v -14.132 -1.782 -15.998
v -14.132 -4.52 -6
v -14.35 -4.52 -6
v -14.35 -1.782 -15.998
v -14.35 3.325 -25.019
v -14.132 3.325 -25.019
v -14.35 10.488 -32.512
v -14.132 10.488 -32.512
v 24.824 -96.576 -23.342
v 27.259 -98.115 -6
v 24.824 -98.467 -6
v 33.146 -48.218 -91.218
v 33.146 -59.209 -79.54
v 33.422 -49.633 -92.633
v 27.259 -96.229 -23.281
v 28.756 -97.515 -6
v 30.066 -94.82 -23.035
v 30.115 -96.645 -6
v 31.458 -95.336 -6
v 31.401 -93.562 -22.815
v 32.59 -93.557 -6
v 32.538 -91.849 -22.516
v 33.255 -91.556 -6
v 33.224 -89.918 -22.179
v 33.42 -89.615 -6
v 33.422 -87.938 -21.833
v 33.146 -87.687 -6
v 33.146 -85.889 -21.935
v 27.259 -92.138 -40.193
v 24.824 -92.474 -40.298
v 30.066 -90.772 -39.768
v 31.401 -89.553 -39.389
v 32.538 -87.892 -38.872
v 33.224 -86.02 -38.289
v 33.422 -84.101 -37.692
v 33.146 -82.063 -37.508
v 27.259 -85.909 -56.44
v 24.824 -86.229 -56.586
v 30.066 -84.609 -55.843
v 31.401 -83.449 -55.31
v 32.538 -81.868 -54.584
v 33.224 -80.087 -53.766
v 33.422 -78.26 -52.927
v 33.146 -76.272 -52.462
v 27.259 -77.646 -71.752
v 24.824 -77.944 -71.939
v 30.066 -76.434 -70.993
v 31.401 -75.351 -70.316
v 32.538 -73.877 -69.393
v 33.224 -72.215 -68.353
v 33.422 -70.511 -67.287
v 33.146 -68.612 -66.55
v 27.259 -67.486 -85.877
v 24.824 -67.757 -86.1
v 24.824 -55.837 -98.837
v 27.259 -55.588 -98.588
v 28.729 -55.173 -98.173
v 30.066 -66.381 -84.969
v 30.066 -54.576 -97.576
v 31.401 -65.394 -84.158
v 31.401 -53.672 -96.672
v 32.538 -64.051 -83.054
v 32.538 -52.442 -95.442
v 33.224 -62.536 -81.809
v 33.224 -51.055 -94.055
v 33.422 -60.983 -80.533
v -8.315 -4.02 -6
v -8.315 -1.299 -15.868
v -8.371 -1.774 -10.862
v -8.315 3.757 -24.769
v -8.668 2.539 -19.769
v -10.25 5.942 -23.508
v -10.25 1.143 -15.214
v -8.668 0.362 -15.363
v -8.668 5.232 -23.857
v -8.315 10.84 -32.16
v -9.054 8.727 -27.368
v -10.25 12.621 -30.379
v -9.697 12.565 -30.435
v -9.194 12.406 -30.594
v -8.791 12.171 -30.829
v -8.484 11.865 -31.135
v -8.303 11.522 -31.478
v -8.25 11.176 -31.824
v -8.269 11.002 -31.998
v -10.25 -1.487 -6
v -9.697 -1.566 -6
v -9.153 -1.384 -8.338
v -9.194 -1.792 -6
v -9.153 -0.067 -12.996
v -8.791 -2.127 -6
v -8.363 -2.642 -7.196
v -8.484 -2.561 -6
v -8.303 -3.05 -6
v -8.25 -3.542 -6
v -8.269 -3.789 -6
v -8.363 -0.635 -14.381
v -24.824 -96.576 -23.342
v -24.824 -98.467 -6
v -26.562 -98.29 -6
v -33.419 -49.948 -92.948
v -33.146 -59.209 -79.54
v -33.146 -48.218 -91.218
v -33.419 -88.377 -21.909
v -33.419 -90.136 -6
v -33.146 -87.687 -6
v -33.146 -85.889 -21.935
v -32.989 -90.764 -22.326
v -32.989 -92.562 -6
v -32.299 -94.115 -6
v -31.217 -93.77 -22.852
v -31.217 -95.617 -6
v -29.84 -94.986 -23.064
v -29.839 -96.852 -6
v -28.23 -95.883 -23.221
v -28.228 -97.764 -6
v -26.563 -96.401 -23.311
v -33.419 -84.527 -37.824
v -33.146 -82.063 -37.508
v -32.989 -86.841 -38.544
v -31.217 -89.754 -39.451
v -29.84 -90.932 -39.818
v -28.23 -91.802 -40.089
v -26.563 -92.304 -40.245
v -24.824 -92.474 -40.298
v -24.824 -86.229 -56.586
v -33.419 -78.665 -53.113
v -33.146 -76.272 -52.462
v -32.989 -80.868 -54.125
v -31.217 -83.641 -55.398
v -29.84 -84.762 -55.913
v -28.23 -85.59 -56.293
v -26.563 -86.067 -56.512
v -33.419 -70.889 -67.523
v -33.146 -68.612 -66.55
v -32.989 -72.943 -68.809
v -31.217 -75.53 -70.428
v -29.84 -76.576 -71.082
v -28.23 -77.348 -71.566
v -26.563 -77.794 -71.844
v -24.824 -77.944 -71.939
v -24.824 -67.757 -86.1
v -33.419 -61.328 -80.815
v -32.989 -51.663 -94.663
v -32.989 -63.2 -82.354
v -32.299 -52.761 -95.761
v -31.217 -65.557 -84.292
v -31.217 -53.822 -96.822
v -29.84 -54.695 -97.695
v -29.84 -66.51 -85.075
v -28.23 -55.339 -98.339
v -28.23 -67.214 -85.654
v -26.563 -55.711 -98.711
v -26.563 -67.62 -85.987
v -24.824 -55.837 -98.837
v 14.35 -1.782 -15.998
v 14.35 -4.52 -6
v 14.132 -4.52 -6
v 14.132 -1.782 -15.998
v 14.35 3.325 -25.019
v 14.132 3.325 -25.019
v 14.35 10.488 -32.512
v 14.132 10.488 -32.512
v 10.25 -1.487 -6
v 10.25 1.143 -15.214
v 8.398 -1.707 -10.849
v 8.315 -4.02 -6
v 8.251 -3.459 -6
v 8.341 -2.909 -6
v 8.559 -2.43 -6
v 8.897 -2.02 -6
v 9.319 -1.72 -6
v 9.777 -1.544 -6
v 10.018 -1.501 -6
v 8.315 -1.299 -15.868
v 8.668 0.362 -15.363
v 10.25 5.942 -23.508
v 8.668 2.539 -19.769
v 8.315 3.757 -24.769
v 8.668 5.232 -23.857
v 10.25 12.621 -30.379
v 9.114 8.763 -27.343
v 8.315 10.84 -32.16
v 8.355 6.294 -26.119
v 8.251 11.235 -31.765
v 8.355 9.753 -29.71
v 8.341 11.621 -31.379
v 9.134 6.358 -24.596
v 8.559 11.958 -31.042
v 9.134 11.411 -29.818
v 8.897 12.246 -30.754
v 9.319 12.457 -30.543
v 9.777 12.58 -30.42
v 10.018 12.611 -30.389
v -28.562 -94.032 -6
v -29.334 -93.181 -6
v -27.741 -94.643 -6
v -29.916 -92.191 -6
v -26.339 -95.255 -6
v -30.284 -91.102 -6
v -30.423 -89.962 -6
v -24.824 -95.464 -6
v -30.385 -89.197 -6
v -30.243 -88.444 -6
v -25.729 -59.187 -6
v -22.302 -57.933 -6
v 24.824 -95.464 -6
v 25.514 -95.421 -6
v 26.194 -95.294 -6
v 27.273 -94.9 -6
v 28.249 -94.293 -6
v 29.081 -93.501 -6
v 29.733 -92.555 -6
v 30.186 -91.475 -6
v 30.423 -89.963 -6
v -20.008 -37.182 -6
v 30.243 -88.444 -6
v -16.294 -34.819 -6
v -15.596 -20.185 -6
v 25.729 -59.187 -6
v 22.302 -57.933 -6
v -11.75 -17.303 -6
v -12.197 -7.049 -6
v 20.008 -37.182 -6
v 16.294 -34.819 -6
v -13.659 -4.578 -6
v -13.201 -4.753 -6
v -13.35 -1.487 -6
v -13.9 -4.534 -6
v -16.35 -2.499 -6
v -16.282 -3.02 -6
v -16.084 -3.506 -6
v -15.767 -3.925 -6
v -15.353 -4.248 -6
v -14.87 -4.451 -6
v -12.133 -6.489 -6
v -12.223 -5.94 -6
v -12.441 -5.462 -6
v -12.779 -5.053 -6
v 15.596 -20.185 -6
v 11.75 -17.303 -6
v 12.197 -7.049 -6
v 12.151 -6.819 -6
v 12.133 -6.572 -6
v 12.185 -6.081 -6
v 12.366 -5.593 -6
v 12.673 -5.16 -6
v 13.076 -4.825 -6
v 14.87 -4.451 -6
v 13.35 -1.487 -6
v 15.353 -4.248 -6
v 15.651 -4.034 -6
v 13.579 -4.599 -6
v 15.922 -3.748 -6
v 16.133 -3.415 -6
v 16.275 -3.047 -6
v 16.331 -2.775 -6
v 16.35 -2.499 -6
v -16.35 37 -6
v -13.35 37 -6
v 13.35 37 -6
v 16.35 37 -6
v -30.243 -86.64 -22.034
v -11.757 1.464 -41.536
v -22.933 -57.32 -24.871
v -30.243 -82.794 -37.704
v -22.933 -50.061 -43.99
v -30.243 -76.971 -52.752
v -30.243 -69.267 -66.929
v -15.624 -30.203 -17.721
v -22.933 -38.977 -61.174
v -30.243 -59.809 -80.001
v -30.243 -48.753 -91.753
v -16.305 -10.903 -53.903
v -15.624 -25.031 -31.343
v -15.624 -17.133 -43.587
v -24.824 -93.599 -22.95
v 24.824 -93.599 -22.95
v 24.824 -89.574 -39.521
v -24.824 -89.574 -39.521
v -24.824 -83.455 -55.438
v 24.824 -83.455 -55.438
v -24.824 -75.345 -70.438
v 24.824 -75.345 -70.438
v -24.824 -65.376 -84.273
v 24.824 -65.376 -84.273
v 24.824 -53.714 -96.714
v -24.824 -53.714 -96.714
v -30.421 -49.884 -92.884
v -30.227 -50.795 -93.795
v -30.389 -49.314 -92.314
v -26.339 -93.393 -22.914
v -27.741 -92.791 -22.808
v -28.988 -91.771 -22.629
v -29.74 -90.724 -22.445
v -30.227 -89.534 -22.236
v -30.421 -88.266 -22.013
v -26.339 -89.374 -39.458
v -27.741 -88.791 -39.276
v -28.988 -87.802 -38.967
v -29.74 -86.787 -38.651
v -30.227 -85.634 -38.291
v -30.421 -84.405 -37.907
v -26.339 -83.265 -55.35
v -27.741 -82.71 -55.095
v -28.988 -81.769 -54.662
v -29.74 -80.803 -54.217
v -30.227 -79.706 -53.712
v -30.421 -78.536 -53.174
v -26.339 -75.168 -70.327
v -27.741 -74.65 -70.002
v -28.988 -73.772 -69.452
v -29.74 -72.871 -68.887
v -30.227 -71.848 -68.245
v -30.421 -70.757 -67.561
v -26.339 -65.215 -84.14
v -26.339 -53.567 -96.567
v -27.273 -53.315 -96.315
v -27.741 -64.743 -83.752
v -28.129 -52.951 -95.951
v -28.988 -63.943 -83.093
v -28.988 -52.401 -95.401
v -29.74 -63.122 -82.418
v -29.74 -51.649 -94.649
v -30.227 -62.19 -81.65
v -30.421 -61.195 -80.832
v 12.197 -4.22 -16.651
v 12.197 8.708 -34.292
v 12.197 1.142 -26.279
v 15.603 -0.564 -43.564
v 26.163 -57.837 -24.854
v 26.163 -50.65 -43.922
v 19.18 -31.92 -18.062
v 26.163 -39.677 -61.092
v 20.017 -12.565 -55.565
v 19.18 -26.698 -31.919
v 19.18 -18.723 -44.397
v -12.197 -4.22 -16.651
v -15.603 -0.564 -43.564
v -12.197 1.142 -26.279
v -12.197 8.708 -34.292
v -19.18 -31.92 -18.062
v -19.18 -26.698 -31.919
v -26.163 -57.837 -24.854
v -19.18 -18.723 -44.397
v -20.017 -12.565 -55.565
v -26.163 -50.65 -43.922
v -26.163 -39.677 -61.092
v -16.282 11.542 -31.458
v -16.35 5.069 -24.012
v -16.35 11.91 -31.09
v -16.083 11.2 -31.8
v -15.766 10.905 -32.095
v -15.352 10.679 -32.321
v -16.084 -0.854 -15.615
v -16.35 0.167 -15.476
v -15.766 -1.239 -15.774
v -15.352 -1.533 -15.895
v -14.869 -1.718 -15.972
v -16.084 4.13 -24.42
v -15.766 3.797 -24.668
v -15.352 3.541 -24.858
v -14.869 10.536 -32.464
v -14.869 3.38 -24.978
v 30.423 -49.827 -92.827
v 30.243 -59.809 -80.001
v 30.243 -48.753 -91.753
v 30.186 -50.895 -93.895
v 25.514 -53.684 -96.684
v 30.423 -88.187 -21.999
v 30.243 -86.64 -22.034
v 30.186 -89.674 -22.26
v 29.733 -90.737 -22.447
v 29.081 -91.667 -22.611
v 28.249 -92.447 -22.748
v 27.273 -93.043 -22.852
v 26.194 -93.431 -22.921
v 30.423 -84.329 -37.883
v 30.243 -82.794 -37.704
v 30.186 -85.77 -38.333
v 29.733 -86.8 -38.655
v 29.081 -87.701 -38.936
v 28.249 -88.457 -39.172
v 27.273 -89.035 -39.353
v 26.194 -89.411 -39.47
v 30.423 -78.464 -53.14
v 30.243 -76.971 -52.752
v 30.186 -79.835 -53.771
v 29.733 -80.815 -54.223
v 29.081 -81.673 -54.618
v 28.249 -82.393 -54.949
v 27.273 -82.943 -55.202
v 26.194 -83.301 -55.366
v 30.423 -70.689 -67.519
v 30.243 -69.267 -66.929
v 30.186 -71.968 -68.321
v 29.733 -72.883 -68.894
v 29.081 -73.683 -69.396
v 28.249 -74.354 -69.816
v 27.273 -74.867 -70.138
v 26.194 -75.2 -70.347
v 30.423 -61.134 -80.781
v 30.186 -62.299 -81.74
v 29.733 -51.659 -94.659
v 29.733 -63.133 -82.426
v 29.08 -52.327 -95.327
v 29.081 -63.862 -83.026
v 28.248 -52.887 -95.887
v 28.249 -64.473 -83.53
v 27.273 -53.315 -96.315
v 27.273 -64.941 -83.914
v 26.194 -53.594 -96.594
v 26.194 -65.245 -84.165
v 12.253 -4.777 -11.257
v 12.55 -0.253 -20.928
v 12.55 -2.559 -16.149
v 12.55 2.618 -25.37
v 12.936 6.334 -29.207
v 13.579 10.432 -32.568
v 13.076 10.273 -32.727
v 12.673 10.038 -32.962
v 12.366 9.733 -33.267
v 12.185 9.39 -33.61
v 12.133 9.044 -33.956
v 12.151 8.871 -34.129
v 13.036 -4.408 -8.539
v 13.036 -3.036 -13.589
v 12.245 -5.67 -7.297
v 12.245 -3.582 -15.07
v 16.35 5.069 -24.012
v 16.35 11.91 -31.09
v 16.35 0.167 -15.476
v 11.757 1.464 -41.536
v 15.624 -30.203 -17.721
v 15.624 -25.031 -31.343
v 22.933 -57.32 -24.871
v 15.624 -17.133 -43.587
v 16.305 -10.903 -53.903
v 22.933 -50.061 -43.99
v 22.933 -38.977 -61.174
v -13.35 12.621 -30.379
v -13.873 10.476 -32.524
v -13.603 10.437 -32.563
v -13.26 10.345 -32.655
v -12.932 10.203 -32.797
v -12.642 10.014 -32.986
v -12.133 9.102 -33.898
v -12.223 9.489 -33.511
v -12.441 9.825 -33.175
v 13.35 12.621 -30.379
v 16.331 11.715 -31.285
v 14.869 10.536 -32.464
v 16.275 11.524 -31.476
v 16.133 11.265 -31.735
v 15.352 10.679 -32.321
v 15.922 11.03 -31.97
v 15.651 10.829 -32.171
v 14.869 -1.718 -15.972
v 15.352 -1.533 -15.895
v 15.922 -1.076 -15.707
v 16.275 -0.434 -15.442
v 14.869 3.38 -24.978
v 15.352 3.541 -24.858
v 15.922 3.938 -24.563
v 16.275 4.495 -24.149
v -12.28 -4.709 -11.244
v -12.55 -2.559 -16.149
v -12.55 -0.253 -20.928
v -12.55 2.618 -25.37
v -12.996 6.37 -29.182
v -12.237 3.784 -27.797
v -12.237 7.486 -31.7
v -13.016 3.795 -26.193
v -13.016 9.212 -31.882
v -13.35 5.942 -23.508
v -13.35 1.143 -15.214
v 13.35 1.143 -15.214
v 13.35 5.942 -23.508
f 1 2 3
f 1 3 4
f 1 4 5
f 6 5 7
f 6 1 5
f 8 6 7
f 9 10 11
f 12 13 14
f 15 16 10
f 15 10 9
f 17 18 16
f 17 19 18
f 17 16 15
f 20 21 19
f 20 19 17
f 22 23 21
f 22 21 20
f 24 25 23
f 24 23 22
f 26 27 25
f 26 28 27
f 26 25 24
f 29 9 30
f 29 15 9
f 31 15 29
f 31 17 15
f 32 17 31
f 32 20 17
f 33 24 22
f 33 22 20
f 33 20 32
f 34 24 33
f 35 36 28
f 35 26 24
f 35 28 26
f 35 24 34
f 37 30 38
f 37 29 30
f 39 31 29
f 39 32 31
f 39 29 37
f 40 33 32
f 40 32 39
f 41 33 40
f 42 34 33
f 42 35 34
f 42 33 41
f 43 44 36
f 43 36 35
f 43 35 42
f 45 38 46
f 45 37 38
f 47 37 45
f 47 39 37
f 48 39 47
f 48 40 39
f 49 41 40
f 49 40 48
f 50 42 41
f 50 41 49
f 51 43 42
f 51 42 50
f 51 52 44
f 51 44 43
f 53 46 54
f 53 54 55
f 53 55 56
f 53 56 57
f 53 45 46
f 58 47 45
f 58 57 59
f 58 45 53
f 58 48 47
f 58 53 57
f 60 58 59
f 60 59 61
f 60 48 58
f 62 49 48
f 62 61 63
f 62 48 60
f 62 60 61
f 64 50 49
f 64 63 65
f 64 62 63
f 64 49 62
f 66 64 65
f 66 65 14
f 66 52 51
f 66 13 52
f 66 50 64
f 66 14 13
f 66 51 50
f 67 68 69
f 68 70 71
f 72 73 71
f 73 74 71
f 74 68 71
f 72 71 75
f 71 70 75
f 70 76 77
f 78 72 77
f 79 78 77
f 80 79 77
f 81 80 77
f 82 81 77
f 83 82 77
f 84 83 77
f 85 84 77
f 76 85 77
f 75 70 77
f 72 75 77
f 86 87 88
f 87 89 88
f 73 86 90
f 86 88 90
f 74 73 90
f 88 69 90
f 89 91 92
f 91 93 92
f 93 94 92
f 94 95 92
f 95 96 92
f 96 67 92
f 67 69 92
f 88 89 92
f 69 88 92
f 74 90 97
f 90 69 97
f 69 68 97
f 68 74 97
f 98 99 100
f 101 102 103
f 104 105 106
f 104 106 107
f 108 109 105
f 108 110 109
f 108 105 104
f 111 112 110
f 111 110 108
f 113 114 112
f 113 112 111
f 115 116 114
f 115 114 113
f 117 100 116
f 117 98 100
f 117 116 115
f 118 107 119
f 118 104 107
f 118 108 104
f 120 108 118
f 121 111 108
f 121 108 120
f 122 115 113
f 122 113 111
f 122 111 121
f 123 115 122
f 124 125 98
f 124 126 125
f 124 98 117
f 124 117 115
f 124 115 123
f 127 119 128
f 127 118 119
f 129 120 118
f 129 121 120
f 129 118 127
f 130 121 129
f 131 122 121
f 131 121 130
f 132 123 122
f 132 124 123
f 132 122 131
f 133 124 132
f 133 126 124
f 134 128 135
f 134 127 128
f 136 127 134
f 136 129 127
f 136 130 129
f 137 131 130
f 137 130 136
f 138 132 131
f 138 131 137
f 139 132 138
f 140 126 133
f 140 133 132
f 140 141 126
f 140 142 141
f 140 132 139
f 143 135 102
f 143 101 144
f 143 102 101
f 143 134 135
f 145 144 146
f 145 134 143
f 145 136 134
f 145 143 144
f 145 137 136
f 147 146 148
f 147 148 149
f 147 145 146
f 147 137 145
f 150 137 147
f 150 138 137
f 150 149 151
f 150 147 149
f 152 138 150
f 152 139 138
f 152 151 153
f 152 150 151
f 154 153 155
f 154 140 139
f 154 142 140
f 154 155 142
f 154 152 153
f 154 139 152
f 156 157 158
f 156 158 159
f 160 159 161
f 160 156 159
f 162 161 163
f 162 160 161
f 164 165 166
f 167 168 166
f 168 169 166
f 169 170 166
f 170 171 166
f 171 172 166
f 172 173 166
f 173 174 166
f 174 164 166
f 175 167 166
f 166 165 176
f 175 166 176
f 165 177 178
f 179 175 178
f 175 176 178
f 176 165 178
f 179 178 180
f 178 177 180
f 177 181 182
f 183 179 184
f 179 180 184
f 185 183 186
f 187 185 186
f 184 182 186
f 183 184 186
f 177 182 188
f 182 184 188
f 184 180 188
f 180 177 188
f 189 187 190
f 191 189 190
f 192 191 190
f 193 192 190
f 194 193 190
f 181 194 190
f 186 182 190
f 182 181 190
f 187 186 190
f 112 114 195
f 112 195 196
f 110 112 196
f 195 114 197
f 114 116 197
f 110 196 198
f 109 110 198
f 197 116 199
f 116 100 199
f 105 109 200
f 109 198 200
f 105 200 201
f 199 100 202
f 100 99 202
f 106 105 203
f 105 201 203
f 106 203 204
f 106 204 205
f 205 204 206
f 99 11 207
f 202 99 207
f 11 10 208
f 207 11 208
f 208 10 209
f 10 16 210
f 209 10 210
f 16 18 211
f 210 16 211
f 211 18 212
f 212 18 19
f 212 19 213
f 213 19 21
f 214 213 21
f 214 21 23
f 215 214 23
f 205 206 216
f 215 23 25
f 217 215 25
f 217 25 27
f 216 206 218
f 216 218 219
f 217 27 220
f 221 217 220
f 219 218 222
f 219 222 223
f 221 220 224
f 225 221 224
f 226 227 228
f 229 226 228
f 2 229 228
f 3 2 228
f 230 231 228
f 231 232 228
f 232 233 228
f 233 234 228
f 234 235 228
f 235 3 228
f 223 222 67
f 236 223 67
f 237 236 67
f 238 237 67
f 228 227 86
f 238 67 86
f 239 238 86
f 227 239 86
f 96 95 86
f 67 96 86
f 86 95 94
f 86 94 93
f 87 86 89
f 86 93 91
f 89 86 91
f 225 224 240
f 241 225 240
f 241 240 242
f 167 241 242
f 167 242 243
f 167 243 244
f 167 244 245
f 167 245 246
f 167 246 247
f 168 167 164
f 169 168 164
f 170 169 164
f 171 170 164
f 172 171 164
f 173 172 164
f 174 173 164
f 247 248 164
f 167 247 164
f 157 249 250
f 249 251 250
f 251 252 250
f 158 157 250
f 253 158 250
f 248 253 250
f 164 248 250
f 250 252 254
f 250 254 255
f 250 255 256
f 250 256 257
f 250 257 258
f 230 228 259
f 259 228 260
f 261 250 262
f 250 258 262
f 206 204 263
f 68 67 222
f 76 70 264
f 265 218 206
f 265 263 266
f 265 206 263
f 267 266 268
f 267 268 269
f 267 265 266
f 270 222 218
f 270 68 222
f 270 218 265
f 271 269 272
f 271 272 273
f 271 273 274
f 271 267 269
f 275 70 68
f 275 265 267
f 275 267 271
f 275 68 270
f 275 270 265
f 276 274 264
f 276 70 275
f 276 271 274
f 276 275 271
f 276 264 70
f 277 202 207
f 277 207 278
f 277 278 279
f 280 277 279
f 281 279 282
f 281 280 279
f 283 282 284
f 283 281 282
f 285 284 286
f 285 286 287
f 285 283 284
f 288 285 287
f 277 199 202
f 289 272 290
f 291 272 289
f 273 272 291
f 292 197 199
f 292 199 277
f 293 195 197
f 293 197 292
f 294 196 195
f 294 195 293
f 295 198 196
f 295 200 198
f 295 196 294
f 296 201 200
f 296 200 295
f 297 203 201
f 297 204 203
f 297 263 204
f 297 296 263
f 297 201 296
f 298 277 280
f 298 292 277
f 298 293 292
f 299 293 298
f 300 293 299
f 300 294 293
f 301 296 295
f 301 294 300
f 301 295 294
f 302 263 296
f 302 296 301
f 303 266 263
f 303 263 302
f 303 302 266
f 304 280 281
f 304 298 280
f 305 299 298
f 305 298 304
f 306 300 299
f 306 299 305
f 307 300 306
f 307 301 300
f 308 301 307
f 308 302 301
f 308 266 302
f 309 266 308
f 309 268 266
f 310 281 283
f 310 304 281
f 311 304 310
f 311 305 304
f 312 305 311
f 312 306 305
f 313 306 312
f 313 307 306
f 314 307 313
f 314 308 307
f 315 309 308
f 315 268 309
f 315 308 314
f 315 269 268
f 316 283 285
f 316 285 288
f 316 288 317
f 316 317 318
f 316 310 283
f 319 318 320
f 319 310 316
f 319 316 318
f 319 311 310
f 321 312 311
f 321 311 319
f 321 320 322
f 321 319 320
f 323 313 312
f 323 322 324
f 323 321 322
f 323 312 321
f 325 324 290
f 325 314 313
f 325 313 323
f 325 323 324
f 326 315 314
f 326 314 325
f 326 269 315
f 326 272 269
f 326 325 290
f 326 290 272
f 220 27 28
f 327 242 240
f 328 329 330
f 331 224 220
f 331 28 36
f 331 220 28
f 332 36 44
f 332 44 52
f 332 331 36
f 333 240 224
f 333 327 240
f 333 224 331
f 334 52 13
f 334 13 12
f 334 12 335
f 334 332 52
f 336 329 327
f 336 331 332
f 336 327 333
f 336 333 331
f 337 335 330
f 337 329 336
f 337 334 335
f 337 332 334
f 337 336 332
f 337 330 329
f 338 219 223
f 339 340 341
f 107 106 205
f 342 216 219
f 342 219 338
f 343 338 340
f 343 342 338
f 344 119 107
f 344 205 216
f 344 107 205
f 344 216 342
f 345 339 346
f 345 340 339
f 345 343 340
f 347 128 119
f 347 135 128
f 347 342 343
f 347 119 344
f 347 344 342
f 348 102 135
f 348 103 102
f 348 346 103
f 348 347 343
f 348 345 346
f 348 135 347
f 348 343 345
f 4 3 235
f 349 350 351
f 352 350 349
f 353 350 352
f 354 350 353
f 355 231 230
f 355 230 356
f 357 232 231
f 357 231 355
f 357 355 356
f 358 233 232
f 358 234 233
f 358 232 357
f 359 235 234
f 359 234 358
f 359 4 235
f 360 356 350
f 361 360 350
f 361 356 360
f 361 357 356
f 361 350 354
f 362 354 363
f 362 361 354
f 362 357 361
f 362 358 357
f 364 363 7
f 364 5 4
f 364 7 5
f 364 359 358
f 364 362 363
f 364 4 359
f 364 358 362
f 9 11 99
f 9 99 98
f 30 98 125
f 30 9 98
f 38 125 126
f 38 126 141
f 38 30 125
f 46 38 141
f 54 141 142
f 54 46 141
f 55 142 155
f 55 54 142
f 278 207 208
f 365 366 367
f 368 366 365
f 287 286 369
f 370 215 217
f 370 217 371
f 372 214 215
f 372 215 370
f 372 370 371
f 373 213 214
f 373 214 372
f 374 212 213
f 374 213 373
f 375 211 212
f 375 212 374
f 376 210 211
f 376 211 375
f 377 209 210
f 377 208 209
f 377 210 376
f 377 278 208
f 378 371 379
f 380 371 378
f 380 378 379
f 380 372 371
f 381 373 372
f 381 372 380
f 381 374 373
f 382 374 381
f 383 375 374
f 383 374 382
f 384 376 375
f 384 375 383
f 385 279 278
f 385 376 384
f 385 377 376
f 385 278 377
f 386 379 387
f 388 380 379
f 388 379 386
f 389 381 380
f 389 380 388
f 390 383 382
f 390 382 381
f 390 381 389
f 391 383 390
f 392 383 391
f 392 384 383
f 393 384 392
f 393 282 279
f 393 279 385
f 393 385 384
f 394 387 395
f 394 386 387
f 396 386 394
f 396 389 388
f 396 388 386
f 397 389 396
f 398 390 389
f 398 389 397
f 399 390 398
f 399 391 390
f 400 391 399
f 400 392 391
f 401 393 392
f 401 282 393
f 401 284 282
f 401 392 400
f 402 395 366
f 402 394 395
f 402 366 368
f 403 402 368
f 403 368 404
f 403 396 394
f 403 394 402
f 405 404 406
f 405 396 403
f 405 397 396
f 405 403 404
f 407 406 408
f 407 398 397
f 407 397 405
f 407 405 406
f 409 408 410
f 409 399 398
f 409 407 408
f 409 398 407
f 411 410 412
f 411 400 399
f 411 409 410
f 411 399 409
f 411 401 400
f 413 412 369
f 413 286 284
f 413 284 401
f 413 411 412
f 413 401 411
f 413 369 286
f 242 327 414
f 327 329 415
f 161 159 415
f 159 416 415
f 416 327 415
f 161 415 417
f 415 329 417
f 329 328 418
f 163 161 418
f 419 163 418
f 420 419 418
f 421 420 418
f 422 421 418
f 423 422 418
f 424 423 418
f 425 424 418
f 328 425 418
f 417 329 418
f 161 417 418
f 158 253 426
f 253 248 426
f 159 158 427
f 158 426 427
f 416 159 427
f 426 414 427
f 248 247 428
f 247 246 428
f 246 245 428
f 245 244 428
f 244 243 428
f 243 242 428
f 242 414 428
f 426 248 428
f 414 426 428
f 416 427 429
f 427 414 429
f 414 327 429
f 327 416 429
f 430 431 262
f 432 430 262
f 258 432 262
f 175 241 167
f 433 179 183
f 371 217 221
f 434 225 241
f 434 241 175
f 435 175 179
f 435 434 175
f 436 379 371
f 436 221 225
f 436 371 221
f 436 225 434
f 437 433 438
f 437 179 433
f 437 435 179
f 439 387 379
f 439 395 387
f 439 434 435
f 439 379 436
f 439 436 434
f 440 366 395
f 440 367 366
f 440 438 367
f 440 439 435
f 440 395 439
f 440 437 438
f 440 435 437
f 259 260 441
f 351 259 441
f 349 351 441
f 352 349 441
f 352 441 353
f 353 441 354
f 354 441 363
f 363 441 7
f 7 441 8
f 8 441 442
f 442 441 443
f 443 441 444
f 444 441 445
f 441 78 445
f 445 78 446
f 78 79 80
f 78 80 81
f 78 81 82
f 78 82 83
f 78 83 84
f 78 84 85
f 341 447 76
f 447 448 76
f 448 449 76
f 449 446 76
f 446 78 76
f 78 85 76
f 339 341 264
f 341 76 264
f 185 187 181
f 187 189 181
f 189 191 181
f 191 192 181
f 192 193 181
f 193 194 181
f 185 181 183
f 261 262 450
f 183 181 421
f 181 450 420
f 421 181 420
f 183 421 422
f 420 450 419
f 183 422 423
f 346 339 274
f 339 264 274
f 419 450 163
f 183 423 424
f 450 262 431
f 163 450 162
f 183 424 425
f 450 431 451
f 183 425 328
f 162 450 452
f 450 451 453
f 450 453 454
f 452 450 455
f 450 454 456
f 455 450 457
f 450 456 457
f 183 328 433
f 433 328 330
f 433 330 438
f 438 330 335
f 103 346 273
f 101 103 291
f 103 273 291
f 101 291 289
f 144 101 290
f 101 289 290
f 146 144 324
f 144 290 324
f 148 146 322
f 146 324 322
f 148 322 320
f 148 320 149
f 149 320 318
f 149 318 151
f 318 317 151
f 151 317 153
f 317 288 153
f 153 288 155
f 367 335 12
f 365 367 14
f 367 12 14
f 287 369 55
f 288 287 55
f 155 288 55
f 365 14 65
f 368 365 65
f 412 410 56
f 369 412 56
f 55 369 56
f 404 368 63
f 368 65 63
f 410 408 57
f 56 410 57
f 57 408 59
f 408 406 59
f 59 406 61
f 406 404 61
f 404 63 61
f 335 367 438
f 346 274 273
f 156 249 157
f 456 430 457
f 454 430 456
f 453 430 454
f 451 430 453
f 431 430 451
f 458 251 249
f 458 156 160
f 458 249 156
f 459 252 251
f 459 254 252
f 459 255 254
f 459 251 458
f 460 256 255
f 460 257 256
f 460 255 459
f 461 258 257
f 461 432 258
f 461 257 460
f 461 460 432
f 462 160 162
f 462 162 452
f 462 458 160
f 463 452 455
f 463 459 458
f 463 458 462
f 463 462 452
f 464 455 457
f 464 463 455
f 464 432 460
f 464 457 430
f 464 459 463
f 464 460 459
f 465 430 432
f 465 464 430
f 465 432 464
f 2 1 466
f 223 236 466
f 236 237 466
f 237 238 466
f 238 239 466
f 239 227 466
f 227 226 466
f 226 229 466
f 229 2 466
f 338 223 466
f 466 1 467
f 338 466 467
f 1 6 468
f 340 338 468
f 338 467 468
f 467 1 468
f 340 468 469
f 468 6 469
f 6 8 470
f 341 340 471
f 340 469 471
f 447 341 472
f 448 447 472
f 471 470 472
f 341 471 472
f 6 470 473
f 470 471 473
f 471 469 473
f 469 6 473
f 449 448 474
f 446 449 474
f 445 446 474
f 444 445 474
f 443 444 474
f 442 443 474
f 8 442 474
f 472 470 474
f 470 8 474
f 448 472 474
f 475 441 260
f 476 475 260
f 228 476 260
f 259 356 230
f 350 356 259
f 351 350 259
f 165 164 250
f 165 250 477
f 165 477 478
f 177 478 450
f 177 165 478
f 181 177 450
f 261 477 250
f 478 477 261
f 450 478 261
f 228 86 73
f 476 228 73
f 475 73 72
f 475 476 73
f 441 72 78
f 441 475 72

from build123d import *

# Parameters (mm, degrees)
F1_ANGLE_BACK  = 30
F1_ANGLE       = 120
F2_R           = 2
F4_DEPTH       = 25
F4_DEPTH_BACK  = 25
F5_DEPTH       = 25
F5_DEPTH_BACK  = 25
F8_R           = 5
F10_DEPTH      = 33.4248144675
F10_DEPTH_BACK = 33.4248144675
F12_DEPTH      = 50
F12_DEPTH_BACK = 50


# Not quite as in the source:
# - after a boolean that leaves OpenCascade's solid faulty, fix() repairs it
# - a feature of the source that left no trace in its solid (it failed there, or was rolled back) is left out


with BuildPart() as f1:
    # F0 (on Top) → F1 (revolve)
    with BuildSketch(Plane.XY, mode=Mode.PRIVATE) as f1_sk:
        with BuildLine():
            Line((9.6206148389, -1.9516889929), (7.6821408379, -2.0284350604))
            Line((7.6821408379, -2.0284350604), (30.2427770644, -88.5876107865))
            ThreePointArc((30.2427770644, -88.5876107865), (29.2549191731, -93.4242240292), (24.8238143675, -95.6))
            Line((24.8238143675, -95.6), (-24.8238143675, -95.6))
            ThreePointArc((-24.8238143675, -95.6), (-29.2549191731, -93.4242240292), (-30.2427770644, -88.5876107865))
            Line((-30.2427770644, -88.5876107865), (-7.6821408379, -2.0284350604))
            Line((-7.6821408379, -2.0284350604), (-9.6206148389, -1.9516889929))
            Line((-9.6206148389, -1.9516889929), (-13.35, -1.9516889929))
            Line((-13.35, -1.9516889929), (-13.35, 37))
            Line((-13.35, 37), (-16.35, 37))
            Line((-16.35, 37), (-16.35, -4.9516889929))
            Line((-16.35, -4.9516889929), (-11.5442770978, -4.9516889929))
            Line((-11.5442770978, -4.9516889929), (-33.1457927948, -87.8309737078))
            ThreePointArc((-33.1457927948, -87.8309737078), (-31.6287253189, -95.2586297591), (-24.8238143675, -98.6))
            Line((-24.8238143675, -98.6), (24.8238143675, -98.6))
            ThreePointArc((24.8238143675, -98.6), (31.6287253189, -95.2586297591), (33.1457927948, -87.8309737078))
            Line((33.1457927948, -87.8309737078), (11.5442770978, -4.9516889929))
            Line((11.5442770978, -4.9516889929), (16.35, -4.9516889929))
            Line((16.35, -4.9516889929), (16.35, 37))
            Line((16.35, 37), (13.35, 37))
            Line((13.35, 37), (13.35, -1.9516889929))
            Line((13.35, -1.9516889929), (9.6206148389, -1.9516889929))
        make_face()
    revolve(f1_sk.sketch.rotate(Axis((0.7210588083, 37, 0), (1, 0, 0)), -F1_ANGLE_BACK), axis=Axis((0.7210588083, 37, 0), (1, 0, 0)), revolution_arc=F1_ANGLE)

    # F2
    f2_edges = [f1.edges().sort_by_distance(p)[0] for p in [
        (7.682141, 3.200384, -19.514218),
        (11.544277, 0.668772, -20.975844),
        (16.35, 0.668772, -20.975844),
        (-7.682141, 3.200384, -19.514218),
        (-16.35, 0.668772, -20.975844),
        (-11.544277, 0.668772, -20.975844),
    ]]
    fillet(f2_edges, radius=F2_R)

    # F3 (on Right) → F4 (join, two sides)
    with BuildSketch(Plane.YZ) as f4_sk:
        with BuildLine():
            Line((51.55, 6), (26.6076951546, 6))
            Line((26.6076951546, 6), (34.6184301396, 1.375))
            ThreePointArc((34.6184301396, 1.375), (37.711752374, 2.6562960223), (39.75, 0))
            ThreePointArc((39.75, 0), (38.9445436483, -1.9445436483), (37, -2.75))
            Line((37, -2.75), (37, -6))
            Line((37, -6), (51.55, -6))
            Line((51.55, -6), (51.55, 6))
        make_face()
        with BuildLine():
            ThreePointArc((47.3738633754, 0.95), (47.505593785, 0.4830952573), (47.55, 0))
            ThreePointArc((47.55, 0), (47.505593785, -0.4830952573), (47.3738633754, -0.95))
            ThreePointArc((47.3738633754, -0.95), (46.7738329701, -1.8738329701), (45.85, -2.4738633754))
            ThreePointArc((45.85, -2.4738633754), (44.9, -2.65), (43.95, -2.4738633754))
            ThreePointArc((43.95, -2.4738633754), (43.0261670299, -1.8738329701), (42.4261366246, -0.95))
            ThreePointArc((42.4261366246, -0.95), (42.25, 0), (42.4261366246, 0.95))
            ThreePointArc((42.4261366246, 0.95), (43.0261670299, 1.8738329701), (43.95, 2.4738633754))
            ThreePointArc((43.95, 2.4738633754), (44.9, 2.65), (45.85, 2.4738633754))
            ThreePointArc((45.85, 2.4738633754), (46.7738329701, 1.8738329701), (47.3738633754, 0.95))
        make_face(mode=Mode.SUBTRACT)
        with BuildLine():
            Line((34.6184301396, 1.375), (26.6076951546, 6))
            Line((26.6076951546, 6), (22.45, 6))
            Line((22.45, 6), (22.45, -6))
            Line((22.45, -6), (37, -6))
            Line((37, -6), (37, -2.75))
            ThreePointArc((37, -2.75), (34.6184301396, -1.375), (34.6184301396, 1.375))
        make_face()
        with BuildLine():
            ThreePointArc((31.5738633754, 0.95), (31.705593785, 0.4830952573), (31.75, 0))
            ThreePointArc((31.75, 0), (31.705593785, -0.4830952573), (31.5738633754, -0.95))
            ThreePointArc((31.5738633754, -0.95), (30.9738329701, -1.8738329701), (30.05, -2.4738633754))
            ThreePointArc((30.05, -2.4738633754), (29.1, -2.65), (28.15, -2.4738633754))
            ThreePointArc((28.15, -2.4738633754), (27.2261670299, -1.8738329701), (26.6261366246, -0.95))
            ThreePointArc((26.6261366246, -0.95), (26.45, 0), (26.6261366246, 0.95))
            ThreePointArc((26.6261366246, 0.95), (27.2261670299, 1.8738329701), (28.15, 2.4738633754))
            ThreePointArc((28.15, 2.4738633754), (29.1, 2.65), (30.05, 2.4738633754))
            ThreePointArc((30.05, 2.4738633754), (30.9738329701, 1.8738329701), (31.5738633754, 0.95))
        make_face(mode=Mode.SUBTRACT)
        with BuildLine():
            Line((43.95, 0.95), (43.95, 2.4738633754))
            ThreePointArc((43.95, 2.4738633754), (43.0261670299, 1.8738329701), (42.4261366246, 0.95))
            Line((42.4261366246, 0.95), (43.95, 0.95))
        make_face()
        with BuildLine():
            Line((45.85, 0.95), (47.3738633754, 0.95))
            ThreePointArc((47.3738633754, 0.95), (46.7738329701, 1.8738329701), (45.85, 2.4738633754))
            Line((45.85, 2.4738633754), (45.85, 0.95))
        make_face()
        with BuildLine():
            ThreePointArc((45.85, -2.4738633754), (46.7738329701, -1.8738329701), (47.3738633754, -0.95))
            Line((47.3738633754, -0.95), (45.85, -0.95))
            Line((45.85, -0.95), (45.85, -2.4738633754))
        make_face()
        with BuildLine():
            ThreePointArc((42.4261366246, -0.95), (43.0261670299, -1.8738329701), (43.95, -2.4738633754))
            Line((43.95, -2.4738633754), (43.95, -0.95))
            Line((43.95, -0.95), (42.4261366246, -0.95))
        make_face()
        with BuildLine():
            Line((30.05, 0.95), (31.5738633754, 0.95))
            ThreePointArc((31.5738633754, 0.95), (30.9738329701, 1.8738329701), (30.05, 2.4738633754))
            Line((30.05, 2.4738633754), (30.05, 0.95))
        make_face()
        with BuildLine():
            Line((28.15, 0.95), (28.15, 2.4738633754))
            ThreePointArc((28.15, 2.4738633754), (27.2261670299, 1.8738329701), (26.6261366246, 0.95))
            Line((26.6261366246, 0.95), (28.15, 0.95))
        make_face()
        with BuildLine():
            ThreePointArc((26.6261366246, -0.95), (27.2261670299, -1.8738329701), (28.15, -2.4738633754))
            Line((28.15, -2.4738633754), (28.15, -0.95))
            Line((28.15, -0.95), (26.6261366246, -0.95))
        make_face()
        with BuildLine():
            ThreePointArc((30.05, -2.4738633754), (30.9738329701, -1.8738329701), (31.5738633754, -0.95))
            Line((31.5738633754, -0.95), (30.05, -0.95))
            Line((30.05, -0.95), (30.05, -2.4738633754))
        make_face()
    extrude(amount=F4_DEPTH)
    extrude(f4_sk.sketch, amount=-F4_DEPTH_BACK)

    # F3 (on Right) → F5 (cut, two sides)
    with BuildSketch(Plane.YZ) as f5_sk:
        with BuildLine():
            Line((37, 0), (34.6184301396, 1.375))
            ThreePointArc((34.6184301396, 1.375), (34.6184301396, -1.375), (37, -2.75))
            Line((37, -2.75), (37, 0))
        make_face()
        with BuildLine():
            ThreePointArc((31.5738633754, -0.95), (31.705593785, -0.4830952573), (31.75, 0))
            ThreePointArc((31.75, 0), (31.705593785, 0.4830952573), (31.5738633754, 0.95))
            Line((31.5738633754, 0.95), (30.05, 0.95))
            Line((30.05, 0.95), (30.05, 2.4738633754))
            ThreePointArc((30.05, 2.4738633754), (29.1, 2.65), (28.15, 2.4738633754))
            Line((28.15, 2.4738633754), (28.15, 0.95))
            Line((28.15, 0.95), (26.6261366246, 0.95))
            ThreePointArc((26.6261366246, 0.95), (26.45, 0), (26.6261366246, -0.95))
            Line((26.6261366246, -0.95), (28.15, -0.95))
            Line((28.15, -0.95), (28.15, -2.4738633754))
            ThreePointArc((28.15, -2.4738633754), (29.1, -2.65), (30.05, -2.4738633754))
            Line((30.05, -2.4738633754), (30.05, -0.95))
            Line((30.05, -0.95), (31.5738633754, -0.95))
        make_face()
    extrude(amount=-F5_DEPTH, mode=Mode.SUBTRACT)
    extrude(f5_sk.sketch, amount=F5_DEPTH_BACK, mode=Mode.SUBTRACT)

    add(f1.part.fix(), mode=Mode.REPLACE)

    # F8
    f8_edges = [f1.edges().sort_by_distance(p)[0] for p in [
        (-20.675, 22.45, -6),
        (-20.675, 22.45, 6),
        (0, 51.55, 6),
        (0, 51.55, -6),
    ]]
    fillet(f8_edges, radius=F8_R)

    # F9 (on Right) → F10 (cut, two sides)
    with BuildSketch(Plane.YZ) as f10_sk:
        Polygon((-115.0443181396, -6), (27.45, -6), (46.55, -6), (89.7687226534, -48.6618503928), (83.2566171885, 31.4302965999), (-50.0242002308, 71.4145377278), (-90.0084450841, 71.4145377278), align=None)
    extrude(amount=F10_DEPTH, mode=Mode.SUBTRACT)
    extrude(f10_sk.sketch, amount=-F10_DEPTH_BACK, mode=Mode.SUBTRACT)

    # F11 (on Right) → F12 (cut, two sides)
    with BuildSketch(Plane.YZ) as f12_sk:
        Polygon((57.0278279483, 8.6879674345), (37, -6), (-77.3825557827, -120.3825557827), (-35.5902947485, -136.9153559208), (64.6576955914, -143.4855163097), (76.9502595067, -111.2705171108), (76.9502595067, -24.7986763716), align=None)
    extrude(amount=-F12_DEPTH, mode=Mode.SUBTRACT)
    extrude(f12_sk.sketch, amount=F12_DEPTH_BACK, mode=Mode.SUBTRACT)


solid = f1.part
